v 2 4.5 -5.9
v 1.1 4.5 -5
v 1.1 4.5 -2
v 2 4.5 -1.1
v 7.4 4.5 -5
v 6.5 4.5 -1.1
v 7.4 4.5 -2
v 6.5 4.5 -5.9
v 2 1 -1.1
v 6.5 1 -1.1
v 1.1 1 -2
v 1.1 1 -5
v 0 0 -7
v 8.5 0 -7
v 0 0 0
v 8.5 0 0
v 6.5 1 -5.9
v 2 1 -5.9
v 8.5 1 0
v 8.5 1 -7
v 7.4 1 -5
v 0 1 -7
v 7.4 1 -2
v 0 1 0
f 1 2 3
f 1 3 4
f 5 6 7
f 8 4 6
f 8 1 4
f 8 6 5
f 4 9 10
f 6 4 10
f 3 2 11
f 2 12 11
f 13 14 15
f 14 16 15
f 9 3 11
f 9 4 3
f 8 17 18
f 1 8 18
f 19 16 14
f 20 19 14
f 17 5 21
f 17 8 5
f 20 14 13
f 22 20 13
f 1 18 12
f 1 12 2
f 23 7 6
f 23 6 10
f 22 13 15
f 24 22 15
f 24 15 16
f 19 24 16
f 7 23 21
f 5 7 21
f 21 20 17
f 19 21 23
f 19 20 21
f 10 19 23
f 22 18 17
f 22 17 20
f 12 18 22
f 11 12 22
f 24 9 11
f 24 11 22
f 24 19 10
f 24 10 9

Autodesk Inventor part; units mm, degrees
ref_plane "YZ Plane" through (0, 0, 0) normal (1, 0, 0) x (0, 1, 0)
ref_plane "XZ Plane" through (0, 0, 0) normal (0, 1, 0) x (-1, 0, 0)
ref_plane "XY Plane" through (0, 0, 0) normal (0, 0, 1) x (1, 0, 0)
sketch "Náčrt1" plane through (0, 0, 0) normal (0, 1, 0) x (-1, 0, 0)
  line L0 (0, 0) -> (-8.5, 0)
  line L1 (-8.5, 0) -> (-8.5, -7)
  line L2 (-8.5, -7) -> (0, -7)
  line L3 (0, -7) -> (0, 0)
  dimension "d0" = 8.5
  dimension "d1" = 7
extrude "Vysunutí1" add sketch "Náčrt1" along normal blind 1
sketch "Náčrt2" plane through (0, 1, 0) normal (0, 1, 0) x (1, 0, 0)
  line L0 (1.1, 1.1) -> (7.4, 1.1)
  line L1 (7.4, 1.1) -> (7.4, 5.9)
  line L2 (7.4, 5.9) -> (1.1, 5.9)
  line L3 (1.1, 5.9) -> (1.1, 1.1)
  line L4 (8.5, 7) -> (0, 7) projected
  line L5 (0, 7) -> (0, 0) projected
  dimension "d4" = 6.3
  dimension "d5" = 4.8
  dimension "d6" = 1.1
  dimension "d7" = 1.1
extrude "Vysunutí2" add sketch "Náčrt2" along normal blind 3.5
chamfer "Zkosení1" distance 0.9 angle 45 4 edges at (1.1, 2.75, -5.9) (1.1, 2.75, -1.1) (7.4, 2.75, -1.1) (7.4, 2.75, -5.9)
sketch "Náčrt3" plane through (0, 0, 0) normal (0, 0, 1) x (1, 0, 0)
  point P0 (0, 0)
sketch "Náčrt4" plane through (0, 1, 0) normal (0, 1, 0) x (1, 0, 0)
  point P0 (0, 0)
properties part number "MiddleButton"
